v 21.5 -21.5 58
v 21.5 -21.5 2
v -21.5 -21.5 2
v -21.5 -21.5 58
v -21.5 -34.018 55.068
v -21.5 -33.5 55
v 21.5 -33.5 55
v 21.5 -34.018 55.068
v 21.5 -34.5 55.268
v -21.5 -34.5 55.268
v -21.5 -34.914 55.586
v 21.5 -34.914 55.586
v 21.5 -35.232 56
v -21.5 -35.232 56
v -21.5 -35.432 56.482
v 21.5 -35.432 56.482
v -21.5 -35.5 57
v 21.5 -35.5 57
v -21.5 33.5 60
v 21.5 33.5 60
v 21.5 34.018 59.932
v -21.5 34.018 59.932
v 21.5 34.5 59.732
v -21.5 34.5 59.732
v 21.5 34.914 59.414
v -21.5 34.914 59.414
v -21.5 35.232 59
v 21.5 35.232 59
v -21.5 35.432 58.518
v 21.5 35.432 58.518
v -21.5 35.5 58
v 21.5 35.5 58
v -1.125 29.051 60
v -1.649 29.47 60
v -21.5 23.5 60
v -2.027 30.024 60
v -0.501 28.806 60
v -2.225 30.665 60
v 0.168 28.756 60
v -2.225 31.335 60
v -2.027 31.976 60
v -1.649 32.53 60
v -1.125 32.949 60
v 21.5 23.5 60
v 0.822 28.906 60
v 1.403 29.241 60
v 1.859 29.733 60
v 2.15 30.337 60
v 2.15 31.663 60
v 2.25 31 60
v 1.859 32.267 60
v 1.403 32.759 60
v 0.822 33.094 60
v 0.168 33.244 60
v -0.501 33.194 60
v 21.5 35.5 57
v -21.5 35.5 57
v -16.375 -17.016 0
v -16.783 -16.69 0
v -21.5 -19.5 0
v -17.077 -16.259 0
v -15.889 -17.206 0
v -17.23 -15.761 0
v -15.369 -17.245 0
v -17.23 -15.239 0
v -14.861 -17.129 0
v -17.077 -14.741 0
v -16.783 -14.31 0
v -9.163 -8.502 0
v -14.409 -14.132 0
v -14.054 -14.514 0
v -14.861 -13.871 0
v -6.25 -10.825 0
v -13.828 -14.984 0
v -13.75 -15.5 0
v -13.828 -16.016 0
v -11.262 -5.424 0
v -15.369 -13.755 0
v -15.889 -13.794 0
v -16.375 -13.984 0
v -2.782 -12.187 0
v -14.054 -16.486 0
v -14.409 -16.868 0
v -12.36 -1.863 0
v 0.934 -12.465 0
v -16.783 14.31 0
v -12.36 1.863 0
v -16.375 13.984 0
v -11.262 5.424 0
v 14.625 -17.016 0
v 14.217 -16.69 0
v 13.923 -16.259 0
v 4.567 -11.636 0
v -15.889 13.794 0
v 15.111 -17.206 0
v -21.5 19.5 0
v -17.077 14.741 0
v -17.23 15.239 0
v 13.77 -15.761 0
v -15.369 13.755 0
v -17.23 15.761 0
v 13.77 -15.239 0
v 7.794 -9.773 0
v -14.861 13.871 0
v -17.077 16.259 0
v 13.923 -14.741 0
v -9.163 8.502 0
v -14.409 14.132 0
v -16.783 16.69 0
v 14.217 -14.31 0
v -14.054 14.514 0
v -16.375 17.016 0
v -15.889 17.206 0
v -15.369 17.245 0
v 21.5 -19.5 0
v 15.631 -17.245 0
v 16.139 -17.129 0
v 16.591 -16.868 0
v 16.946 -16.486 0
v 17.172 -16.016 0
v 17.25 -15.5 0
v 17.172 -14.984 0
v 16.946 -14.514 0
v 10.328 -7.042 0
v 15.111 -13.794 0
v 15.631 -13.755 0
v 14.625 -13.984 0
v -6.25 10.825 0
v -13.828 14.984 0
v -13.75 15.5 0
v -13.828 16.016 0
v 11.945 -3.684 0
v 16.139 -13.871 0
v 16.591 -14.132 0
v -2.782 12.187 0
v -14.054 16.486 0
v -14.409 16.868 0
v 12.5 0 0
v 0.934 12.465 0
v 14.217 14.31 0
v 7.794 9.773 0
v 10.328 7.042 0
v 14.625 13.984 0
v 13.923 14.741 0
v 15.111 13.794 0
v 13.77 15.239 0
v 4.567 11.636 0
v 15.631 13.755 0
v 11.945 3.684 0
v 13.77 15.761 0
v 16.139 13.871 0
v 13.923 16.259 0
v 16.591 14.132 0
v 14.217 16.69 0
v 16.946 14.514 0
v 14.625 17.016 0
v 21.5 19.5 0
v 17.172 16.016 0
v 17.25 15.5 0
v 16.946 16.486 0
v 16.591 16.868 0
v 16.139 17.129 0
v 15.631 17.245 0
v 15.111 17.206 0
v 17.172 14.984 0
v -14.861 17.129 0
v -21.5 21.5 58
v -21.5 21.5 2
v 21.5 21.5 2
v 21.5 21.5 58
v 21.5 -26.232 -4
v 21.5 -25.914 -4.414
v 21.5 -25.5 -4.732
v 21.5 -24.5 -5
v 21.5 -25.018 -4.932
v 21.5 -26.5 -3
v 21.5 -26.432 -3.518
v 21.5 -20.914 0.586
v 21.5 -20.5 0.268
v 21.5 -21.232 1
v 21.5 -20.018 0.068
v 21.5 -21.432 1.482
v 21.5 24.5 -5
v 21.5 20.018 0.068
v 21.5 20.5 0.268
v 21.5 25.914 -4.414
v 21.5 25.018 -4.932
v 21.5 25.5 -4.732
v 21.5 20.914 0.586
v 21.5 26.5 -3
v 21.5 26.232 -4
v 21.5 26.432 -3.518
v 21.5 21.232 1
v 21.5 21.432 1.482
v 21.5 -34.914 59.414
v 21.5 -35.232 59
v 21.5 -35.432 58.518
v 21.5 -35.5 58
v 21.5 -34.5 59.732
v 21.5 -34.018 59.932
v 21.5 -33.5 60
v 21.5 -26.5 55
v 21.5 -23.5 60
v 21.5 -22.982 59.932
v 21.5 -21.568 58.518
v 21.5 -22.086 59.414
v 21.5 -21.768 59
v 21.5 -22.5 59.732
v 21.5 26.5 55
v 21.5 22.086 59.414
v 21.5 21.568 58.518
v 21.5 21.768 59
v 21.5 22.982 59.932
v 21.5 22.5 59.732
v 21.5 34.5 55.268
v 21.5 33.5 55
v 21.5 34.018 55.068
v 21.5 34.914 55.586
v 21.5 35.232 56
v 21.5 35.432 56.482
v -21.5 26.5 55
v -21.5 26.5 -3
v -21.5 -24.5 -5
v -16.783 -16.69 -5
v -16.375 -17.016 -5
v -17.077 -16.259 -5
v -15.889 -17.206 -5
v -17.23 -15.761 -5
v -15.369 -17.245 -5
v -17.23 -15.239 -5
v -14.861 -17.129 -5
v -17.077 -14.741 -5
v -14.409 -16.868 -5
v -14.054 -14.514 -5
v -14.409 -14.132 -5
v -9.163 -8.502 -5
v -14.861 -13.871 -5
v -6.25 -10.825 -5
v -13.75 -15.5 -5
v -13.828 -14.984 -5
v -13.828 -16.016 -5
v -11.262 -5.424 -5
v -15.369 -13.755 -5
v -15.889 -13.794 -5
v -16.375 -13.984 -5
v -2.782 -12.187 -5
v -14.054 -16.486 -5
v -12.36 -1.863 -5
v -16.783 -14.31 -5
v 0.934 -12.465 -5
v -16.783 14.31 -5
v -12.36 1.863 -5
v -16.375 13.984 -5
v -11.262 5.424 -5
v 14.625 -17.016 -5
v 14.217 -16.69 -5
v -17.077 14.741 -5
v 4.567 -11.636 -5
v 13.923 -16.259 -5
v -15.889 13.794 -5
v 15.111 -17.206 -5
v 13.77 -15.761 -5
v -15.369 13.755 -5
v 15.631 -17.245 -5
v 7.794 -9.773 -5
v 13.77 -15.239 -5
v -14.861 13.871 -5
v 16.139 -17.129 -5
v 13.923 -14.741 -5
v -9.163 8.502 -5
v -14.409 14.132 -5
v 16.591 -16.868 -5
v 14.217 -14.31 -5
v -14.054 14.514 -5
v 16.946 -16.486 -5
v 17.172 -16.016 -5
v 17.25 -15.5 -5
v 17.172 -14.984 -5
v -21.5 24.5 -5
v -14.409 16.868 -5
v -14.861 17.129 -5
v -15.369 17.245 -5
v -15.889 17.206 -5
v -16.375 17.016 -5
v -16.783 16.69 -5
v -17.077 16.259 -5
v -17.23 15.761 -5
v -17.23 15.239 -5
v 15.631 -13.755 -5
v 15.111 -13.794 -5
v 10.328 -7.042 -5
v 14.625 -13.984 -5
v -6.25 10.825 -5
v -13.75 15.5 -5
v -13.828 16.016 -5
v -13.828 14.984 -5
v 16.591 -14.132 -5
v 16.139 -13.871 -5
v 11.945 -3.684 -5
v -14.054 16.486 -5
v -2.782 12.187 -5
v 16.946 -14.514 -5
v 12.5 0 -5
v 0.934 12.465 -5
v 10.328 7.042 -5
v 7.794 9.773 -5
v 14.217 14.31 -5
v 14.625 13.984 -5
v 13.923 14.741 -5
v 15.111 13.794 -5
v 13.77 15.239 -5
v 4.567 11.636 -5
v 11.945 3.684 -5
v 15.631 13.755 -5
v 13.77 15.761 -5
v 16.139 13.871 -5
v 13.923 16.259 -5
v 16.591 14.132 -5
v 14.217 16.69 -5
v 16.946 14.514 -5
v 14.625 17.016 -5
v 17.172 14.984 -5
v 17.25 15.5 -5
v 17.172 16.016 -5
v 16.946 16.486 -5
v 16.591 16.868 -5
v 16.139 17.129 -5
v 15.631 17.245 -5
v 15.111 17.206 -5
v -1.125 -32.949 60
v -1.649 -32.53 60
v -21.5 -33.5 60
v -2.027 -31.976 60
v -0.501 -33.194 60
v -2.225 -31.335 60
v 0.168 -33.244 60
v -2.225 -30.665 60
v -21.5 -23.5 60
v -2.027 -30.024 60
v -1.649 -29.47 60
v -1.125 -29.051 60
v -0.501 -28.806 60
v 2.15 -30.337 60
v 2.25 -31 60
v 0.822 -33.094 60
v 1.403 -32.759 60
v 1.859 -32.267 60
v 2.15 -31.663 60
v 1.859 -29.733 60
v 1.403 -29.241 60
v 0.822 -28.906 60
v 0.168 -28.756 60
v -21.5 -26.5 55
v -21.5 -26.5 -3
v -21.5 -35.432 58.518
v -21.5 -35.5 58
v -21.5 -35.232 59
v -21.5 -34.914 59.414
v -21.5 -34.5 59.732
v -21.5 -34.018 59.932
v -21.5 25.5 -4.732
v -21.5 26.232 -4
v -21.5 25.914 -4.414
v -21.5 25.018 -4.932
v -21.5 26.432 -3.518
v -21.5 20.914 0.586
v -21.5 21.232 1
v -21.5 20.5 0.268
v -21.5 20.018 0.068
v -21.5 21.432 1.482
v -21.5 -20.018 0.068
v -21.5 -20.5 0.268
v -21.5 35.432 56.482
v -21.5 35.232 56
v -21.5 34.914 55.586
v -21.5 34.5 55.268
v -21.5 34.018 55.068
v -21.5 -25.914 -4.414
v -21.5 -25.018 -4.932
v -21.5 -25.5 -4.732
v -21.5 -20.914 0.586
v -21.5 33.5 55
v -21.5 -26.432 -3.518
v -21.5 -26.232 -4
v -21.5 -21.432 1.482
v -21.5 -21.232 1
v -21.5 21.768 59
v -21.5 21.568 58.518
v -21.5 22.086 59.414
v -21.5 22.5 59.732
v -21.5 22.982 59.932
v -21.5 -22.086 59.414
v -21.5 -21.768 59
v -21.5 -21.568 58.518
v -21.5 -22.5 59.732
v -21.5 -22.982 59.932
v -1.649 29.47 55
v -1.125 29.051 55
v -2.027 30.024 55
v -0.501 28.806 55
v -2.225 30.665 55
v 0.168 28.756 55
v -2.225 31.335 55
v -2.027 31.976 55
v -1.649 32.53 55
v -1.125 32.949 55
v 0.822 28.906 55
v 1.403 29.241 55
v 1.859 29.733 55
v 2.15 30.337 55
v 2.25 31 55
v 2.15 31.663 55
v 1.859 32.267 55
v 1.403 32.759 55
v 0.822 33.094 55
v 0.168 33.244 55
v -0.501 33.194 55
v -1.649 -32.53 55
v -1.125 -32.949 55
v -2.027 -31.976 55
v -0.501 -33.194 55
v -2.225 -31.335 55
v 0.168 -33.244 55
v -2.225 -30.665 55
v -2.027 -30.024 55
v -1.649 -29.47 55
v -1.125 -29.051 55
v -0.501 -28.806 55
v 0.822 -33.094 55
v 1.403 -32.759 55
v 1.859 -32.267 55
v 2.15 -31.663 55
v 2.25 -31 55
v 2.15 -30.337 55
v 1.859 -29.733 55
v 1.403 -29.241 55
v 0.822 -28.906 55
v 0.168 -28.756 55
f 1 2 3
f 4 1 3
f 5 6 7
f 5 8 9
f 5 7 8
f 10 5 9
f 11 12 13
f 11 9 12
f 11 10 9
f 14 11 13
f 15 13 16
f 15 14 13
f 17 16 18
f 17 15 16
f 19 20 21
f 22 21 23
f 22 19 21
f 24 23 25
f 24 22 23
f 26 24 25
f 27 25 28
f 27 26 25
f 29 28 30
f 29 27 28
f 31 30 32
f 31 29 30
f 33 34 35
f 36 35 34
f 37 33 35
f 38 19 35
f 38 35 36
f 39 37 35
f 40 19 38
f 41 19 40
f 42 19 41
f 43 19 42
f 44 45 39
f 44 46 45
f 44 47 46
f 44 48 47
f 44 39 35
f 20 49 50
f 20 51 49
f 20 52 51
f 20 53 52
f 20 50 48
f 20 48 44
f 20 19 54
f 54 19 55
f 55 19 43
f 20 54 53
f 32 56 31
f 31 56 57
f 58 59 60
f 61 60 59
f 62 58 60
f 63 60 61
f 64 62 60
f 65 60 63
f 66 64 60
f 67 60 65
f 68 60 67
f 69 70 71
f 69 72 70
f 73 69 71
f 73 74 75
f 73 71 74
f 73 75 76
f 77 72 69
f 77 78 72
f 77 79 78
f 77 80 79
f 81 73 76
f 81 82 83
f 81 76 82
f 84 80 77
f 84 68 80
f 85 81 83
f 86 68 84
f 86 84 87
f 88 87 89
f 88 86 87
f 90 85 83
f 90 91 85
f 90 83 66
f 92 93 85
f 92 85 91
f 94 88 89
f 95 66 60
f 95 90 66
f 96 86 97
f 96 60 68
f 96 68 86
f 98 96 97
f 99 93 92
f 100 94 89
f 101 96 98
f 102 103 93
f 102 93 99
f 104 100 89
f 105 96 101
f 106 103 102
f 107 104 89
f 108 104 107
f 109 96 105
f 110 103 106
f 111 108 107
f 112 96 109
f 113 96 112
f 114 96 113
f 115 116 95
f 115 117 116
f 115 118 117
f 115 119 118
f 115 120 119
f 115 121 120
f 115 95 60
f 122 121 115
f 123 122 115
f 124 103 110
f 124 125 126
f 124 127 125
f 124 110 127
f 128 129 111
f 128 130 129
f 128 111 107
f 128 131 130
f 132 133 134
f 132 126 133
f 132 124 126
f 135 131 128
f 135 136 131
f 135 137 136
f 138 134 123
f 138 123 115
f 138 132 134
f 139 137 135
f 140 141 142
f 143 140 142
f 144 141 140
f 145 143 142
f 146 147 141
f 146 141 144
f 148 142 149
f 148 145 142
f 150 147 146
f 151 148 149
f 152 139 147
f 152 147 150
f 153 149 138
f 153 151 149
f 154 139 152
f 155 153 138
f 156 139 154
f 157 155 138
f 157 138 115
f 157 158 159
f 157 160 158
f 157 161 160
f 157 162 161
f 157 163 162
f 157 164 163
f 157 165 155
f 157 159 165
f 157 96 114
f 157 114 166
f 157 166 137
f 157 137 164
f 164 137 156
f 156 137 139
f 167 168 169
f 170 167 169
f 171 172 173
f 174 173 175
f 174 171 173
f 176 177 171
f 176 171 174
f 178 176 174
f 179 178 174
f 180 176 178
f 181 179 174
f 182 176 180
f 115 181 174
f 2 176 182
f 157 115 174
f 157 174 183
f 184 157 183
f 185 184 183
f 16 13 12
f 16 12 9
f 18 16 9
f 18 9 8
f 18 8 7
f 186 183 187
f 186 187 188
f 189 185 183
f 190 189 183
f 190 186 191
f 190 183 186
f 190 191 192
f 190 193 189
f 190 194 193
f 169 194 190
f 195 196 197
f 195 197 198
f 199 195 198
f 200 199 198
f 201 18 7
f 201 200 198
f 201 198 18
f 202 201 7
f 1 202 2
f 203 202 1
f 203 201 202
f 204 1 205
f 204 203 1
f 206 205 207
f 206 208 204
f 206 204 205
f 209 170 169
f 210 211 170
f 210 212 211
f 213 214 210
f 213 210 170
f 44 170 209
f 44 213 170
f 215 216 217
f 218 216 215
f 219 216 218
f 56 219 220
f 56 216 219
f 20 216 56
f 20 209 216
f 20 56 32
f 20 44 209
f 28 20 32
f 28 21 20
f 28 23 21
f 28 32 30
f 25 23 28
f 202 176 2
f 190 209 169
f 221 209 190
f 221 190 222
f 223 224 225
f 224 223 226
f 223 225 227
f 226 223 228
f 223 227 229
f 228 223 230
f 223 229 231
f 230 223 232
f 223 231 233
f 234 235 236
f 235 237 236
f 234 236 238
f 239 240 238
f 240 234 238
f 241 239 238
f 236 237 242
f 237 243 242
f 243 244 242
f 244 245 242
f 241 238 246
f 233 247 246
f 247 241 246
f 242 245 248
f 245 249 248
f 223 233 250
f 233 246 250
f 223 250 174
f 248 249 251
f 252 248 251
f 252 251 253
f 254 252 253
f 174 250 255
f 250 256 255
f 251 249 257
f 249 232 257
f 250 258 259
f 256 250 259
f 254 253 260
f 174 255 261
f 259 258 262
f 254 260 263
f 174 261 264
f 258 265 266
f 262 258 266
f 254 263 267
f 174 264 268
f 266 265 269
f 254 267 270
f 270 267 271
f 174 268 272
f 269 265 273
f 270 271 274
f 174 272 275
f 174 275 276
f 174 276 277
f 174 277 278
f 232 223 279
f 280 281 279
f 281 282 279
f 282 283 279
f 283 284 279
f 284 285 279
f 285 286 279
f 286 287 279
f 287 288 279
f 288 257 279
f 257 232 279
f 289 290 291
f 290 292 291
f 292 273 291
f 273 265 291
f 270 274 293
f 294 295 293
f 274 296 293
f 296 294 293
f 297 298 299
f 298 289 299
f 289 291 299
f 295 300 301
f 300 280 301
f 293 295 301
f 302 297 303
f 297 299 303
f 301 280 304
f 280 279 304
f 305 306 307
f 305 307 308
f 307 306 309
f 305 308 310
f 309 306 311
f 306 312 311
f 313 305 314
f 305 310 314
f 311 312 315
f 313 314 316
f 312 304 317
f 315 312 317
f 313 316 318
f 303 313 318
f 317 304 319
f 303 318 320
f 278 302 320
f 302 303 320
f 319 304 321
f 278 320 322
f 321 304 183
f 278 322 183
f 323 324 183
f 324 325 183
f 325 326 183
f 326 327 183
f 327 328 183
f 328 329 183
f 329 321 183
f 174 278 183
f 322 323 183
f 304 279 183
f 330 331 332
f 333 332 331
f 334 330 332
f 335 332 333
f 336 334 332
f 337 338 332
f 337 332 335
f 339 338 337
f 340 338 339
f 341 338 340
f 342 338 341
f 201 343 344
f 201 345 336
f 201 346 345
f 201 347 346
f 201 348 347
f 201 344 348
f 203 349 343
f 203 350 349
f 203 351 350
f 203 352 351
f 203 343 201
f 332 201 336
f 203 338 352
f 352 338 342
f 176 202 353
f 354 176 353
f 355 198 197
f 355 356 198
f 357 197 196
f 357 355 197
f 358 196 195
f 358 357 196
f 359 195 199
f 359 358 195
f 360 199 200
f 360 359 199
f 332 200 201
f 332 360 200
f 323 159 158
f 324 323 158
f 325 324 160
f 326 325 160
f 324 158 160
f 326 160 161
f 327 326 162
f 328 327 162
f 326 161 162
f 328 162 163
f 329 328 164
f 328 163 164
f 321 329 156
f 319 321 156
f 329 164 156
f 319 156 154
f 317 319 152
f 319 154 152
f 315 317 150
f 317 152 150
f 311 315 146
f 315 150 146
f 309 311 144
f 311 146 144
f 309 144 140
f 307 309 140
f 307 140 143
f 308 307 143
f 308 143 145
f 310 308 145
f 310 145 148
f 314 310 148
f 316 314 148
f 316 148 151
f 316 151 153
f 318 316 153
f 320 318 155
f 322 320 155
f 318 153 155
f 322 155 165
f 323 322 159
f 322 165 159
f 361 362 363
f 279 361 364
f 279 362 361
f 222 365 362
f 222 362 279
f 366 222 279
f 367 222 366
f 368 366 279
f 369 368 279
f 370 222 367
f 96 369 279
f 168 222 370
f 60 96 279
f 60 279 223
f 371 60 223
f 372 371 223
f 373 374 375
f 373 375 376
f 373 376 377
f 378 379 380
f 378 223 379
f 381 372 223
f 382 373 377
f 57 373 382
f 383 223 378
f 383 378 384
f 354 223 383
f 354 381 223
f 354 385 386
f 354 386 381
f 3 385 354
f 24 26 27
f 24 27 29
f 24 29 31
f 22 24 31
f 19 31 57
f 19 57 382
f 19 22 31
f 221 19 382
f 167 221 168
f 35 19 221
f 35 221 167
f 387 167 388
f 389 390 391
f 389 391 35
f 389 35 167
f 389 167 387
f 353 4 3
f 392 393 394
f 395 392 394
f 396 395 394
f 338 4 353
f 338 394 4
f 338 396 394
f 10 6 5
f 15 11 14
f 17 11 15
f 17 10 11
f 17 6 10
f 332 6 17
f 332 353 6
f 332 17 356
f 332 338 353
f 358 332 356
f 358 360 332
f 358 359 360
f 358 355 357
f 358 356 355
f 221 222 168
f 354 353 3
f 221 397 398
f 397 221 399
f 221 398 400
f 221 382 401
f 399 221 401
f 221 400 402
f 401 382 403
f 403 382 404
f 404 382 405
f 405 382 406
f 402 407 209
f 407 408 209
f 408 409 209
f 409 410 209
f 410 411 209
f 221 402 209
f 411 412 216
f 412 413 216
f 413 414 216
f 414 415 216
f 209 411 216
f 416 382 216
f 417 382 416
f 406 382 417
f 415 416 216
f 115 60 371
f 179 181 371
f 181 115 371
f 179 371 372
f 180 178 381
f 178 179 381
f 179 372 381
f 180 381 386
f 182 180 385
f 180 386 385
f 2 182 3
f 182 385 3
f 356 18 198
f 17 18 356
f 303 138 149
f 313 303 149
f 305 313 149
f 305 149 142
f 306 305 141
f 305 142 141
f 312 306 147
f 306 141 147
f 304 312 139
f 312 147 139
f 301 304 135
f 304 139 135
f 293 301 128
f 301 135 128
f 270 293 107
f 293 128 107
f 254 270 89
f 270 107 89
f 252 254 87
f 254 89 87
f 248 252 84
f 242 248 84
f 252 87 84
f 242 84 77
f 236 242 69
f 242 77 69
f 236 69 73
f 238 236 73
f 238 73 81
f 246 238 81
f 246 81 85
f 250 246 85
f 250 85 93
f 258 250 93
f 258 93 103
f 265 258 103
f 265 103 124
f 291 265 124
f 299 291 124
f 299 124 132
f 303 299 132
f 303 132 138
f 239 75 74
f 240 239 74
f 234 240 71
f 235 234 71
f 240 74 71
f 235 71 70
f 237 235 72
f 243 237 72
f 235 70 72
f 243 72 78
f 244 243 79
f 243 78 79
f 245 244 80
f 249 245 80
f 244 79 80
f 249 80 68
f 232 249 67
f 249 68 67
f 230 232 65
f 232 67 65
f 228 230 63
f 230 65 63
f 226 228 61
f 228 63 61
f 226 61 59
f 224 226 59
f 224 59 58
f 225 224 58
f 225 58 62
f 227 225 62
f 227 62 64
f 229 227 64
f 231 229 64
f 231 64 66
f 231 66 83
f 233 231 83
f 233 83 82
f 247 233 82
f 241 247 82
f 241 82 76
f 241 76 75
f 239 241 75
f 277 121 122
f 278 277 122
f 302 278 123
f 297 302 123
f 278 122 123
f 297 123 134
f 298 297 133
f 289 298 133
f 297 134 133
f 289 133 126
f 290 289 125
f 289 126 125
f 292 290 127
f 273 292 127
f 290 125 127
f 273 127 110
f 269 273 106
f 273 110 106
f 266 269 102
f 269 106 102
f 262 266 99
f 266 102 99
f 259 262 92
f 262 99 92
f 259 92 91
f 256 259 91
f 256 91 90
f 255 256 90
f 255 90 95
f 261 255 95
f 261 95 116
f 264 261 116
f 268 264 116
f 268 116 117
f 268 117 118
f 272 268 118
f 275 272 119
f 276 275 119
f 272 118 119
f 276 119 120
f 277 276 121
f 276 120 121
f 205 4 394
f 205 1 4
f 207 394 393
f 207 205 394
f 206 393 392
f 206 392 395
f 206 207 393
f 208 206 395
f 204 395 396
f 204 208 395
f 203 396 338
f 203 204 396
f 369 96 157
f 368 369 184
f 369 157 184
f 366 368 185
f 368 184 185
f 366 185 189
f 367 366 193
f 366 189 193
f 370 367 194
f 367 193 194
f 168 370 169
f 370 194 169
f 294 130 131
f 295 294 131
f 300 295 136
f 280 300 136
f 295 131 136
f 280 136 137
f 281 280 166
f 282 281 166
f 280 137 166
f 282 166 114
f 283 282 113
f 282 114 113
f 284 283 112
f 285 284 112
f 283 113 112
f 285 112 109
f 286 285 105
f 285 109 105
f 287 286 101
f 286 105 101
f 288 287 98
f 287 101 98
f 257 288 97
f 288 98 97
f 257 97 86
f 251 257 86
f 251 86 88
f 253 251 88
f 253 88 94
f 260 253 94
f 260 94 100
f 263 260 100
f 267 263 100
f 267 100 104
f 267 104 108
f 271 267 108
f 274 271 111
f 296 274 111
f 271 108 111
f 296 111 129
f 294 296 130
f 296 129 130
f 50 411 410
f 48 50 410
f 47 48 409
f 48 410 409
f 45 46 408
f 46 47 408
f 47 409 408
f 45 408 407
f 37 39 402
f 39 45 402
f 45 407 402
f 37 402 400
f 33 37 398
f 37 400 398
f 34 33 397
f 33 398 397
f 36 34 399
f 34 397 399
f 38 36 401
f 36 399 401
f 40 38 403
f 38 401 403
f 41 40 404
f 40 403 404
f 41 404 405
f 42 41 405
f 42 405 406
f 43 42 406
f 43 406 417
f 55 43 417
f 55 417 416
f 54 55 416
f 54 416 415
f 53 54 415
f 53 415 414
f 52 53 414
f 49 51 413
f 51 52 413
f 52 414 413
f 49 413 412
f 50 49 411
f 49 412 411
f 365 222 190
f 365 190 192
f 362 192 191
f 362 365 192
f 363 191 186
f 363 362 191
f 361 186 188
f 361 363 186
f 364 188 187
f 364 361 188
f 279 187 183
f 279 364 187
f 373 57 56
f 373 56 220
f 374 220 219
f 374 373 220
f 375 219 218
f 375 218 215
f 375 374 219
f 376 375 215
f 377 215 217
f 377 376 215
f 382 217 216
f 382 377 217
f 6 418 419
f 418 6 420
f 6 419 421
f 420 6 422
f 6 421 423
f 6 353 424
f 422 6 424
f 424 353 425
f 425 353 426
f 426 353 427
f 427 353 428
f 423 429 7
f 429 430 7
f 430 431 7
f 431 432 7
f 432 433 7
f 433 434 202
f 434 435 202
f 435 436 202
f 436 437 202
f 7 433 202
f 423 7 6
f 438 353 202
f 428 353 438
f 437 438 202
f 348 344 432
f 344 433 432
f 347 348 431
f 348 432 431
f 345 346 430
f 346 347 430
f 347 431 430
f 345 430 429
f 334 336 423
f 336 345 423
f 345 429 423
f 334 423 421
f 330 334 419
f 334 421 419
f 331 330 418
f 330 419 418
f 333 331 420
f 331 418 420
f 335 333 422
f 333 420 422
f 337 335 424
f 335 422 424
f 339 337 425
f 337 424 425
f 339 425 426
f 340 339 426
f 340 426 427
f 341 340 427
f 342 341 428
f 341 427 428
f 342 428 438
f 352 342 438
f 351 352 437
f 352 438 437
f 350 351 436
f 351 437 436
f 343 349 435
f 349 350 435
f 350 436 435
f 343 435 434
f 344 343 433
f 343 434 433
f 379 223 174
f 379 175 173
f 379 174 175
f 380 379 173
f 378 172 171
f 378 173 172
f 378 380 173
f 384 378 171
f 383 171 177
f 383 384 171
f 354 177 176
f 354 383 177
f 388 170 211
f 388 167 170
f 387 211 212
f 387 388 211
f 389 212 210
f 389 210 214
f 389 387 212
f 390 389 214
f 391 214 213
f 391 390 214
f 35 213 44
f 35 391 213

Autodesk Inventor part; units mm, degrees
ref_plane "YZ Plane" through (0, 0, 0) normal (1, 0, 0) x (0, 1, 0)
ref_plane "XZ Plane" through (0, 0, 0) normal (0, 1, 0) x (-1, 0, 0)
ref_plane "XY Plane" through (0, 0, 0) normal (0, 0, 1) x (1, 0, 0)
sketch "Sketch1" plane through (0, 0, 0) normal (0, 0, 1) x (1, 0, 0)
  circle A0 centre (-15.5, -15.5) radius 1.75
  circle A1 centre (15.5, -15.5) radius 1.75
  circle A2 centre (-15.5, 15.5) radius 1.75
  circle A3 centre (15.5, 15.5) radius 1.75
  circle A4 centre (0, 0) radius 12.5
  line L0 (-21.5, 21.5) -> (21.5, 21.5)
  line L1 (21.5, -21.5) -> (-21.5, -21.5)
  line L2 (-21.5, 21.5) -> (21.5, -21.5) construction
  line L3 (21.5, 21.5) -> (-21.5, -21.5) construction
  line L4 (-21.5, -21.5) -> (21.5, -21.5)
  line L5 (-21.5, 21.5) -> (-21.5, -21.5)
  line L6 (21.5, 21.5) -> (21.5, -21.5)
  line L7 (-21.5, 21.5) -> (21.5, 21.5)
  line L8 (21.5, 21.5) -> (21.5, 26.5)
  line L9 (21.5, 26.5) -> (-21.5, 26.5)
  line L10 (-21.5, 26.5) -> (-21.5, 21.5)
  line L11 (0, 0) -> (-7.0913, 0)
  line L12 (21.5, -21.5) -> (21.5, -26.5)
  line L13 (21.5, -26.5) -> (-21.5, -26.5)
  line L14 (-21.5, -26.5) -> (-21.5, -21.5)
  point P0 (0, 26.5)
  point P1 (0, -26.5)
  point P2 (21.5, 21.5)
  dimension "d0" = 3.5
  dimension "d1" = 31
  dimension "d2" = 25
  dimension "d3" = 43
  dimension "d4" = 43
  dimension "d6" = 15.5
  dimension "d7" = 43
  dimension "d8" = 5
extrude "face" add sketch "Sketch1" against normal blind 5
extrude "length" add sketch "Sketch1" along normal blind 55 contours L10 L9 L8 L0 | L1 L12 L13 L14
sketch "Sketch2" plane through (0, 0, 55) normal (0, 0, 1) x (1, 0, 0)
  line L0 (-21.5, -21.5) -> (21.5, -21.5) projected
  line L1 (21.5, -21.5) -> (21.5, 21.5) projected
  line L2 (21.5, 21.5) -> (-21.5, 21.5) projected
  line L3 (-21.5, 21.5) -> (-21.5, -21.5) projected
  circle A0 centre (15.5, 15.5) radius 1.75 projected
  circle A1 centre (-15.5, 15.5) radius 1.75 projected
  circle A2 centre (-15.5, -15.5) radius 1.75 projected
  circle A3 centre (15.5, -15.5) radius 1.75 projected
  circle A4 centre (0, 0) radius 12.5 projected
  line L4 (-21.5, 26.5) -> (-21.5, 21.5) projected
  line L5 (-21.5, 21.5) -> (21.5, 21.5) projected
  line L6 (21.5, 21.5) -> (21.5, 26.5) projected
  line L7 (21.5, 26.5) -> (-21.5, 26.5) projected
  line L8 (21.5, -26.5) -> (21.5, -21.5) projected
  line L9 (21.5, -21.5) -> (-21.5, -21.5) projected
  line L10 (-21.5, -21.5) -> (-21.5, -26.5) projected
  line L11 (-21.5, -26.5) -> (21.5, -26.5) projected
  line L12 (-21.5, 26.5) -> (21.5, 26.5)
  line L13 (21.5, 26.5) -> (21.5, 35.5)
  line L14 (21.5, 35.5) -> (-21.5, 35.5)
  line L15 (-21.5, 35.5) -> (-21.5, 26.5)
  line L16 (0, 0) -> (-5.3455, 0)
  line L17 (21.5, -26.5) -> (21.5, -35.5)
  line L18 (21.5, -35.5) -> (-21.5, -35.5)
  line L19 (-21.5, -35.5) -> (-21.5, -26.5)
  line L20 (-21.5, -26.5) -> (21.5, -26.5) projected
  circle A5 centre (0, -31) radius 2.25
  circle A6 centre (0, 31) radius 2.25
  point P0 (-21.5, -31)
  dimension "d13" = 9
  dimension "d19" = 4.5
extrude "mount" add sketch "Sketch2" along normal blind 5 contours L0 L8 L11 L10 | L4 L7 L6 L2 | L11 L17 L18 L19 | L15 L14 L13 L7
fillet "Fillet3" radius 2 2 edges at (0, -21.5, 0) (0, 21.5, 0)
fillet "Fillet4" radius 2 2 edges at (0, 21.5, 60) (0, -21.5, 60)
fillet "Fillet5" radius 2 6 edges at (0, -26.5, -5) (0, 26.5, -5) (0, 35.5, 55) (0, 35.5, 60) (0, -35.5, 55) (0, -35.5, 60)
properties part number "motor_holder_V4"
